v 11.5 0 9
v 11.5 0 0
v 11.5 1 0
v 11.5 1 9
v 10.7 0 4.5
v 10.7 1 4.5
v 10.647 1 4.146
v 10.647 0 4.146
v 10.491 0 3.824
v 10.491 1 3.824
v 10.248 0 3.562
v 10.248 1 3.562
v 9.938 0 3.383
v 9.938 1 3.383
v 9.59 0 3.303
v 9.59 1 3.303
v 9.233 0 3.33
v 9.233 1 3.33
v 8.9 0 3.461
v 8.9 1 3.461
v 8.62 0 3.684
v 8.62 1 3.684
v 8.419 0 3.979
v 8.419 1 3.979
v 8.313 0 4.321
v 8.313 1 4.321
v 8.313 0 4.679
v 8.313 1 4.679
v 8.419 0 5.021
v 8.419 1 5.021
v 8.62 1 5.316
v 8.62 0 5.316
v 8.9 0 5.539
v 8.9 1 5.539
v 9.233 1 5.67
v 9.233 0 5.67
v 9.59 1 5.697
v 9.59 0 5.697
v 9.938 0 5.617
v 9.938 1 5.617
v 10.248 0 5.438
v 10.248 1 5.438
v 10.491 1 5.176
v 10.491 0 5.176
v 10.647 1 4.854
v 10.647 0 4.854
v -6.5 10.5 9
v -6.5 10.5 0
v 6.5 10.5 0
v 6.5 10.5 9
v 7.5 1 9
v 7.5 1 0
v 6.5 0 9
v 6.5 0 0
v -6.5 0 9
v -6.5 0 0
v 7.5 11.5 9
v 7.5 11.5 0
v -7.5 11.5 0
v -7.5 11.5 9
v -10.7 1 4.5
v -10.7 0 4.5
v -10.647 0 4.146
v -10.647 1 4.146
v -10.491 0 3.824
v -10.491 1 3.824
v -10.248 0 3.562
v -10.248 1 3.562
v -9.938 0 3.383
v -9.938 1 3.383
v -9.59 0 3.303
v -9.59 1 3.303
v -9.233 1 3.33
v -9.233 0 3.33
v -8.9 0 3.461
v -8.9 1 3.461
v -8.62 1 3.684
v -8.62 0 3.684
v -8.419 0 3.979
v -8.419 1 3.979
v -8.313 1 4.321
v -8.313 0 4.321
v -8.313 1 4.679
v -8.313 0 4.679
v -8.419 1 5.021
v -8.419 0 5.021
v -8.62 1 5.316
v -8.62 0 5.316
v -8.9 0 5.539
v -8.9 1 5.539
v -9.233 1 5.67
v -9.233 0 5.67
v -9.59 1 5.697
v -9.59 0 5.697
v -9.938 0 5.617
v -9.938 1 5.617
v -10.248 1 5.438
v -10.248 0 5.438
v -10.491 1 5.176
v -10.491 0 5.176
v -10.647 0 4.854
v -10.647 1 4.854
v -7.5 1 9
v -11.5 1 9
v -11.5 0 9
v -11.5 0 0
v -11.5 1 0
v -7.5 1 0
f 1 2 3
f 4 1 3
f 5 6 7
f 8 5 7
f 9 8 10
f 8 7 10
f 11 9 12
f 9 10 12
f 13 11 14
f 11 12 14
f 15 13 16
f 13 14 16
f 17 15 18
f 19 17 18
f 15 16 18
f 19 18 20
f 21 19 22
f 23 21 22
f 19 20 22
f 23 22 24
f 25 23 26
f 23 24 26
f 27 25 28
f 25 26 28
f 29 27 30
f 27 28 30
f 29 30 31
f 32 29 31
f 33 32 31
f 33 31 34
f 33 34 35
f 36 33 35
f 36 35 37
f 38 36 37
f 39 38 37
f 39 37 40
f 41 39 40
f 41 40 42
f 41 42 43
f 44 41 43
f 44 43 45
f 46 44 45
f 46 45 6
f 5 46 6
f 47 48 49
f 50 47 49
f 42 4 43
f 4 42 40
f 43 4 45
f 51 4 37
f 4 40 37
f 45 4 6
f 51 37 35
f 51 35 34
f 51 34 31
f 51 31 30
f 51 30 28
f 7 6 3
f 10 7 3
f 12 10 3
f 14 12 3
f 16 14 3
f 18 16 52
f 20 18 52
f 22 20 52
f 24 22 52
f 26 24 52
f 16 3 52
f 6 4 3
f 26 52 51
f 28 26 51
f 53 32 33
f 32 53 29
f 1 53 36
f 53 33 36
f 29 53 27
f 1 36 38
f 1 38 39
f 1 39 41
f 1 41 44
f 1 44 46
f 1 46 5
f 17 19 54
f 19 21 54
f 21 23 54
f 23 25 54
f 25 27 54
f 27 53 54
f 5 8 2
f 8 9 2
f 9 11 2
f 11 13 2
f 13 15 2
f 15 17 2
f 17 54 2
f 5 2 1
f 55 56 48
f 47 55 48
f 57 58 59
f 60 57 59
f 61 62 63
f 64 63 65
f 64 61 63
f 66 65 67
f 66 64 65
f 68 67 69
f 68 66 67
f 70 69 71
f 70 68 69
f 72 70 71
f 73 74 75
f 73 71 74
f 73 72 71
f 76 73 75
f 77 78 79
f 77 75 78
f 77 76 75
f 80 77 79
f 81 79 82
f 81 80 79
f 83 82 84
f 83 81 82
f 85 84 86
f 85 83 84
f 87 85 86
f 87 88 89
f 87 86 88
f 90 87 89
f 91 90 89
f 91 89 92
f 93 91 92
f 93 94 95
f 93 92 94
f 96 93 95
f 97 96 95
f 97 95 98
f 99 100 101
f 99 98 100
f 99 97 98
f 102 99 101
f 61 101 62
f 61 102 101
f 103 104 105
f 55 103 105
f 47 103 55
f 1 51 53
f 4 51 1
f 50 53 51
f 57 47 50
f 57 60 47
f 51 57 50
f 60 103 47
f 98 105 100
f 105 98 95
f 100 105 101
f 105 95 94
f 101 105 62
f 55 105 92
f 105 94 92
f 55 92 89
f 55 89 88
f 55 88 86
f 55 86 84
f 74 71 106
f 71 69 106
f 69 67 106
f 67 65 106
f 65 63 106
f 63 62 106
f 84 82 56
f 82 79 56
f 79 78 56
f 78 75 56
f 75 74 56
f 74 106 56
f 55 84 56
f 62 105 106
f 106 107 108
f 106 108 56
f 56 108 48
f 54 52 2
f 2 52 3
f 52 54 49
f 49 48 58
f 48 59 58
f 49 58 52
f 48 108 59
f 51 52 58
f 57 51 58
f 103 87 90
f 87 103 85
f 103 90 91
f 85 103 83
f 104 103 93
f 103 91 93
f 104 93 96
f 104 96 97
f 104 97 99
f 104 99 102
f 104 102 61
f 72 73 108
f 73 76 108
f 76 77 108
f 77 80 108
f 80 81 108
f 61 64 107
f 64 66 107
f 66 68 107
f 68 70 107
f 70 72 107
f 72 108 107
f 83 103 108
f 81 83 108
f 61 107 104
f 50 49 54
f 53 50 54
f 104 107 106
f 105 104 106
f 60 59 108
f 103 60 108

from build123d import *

# Parameters (mm, degrees)
BOSS_EXTRUDE1_DEPTH = 9
SKETCH2_R           = 1.2
CUT_EXTRUDE1_DEPTH  = 29


with BuildPart() as part:
    # Sketch1 → Boss-Extrude1 (new body)
    with BuildSketch(Plane.XY):
        Polygon((7.5, 1), (7.5, 11.5), (-7.5, 11.5), (-7.5, 1), (-11.5, 1), (-11.5, 0), (-6.5, 0), (-6.5, 10.5), (6.5, 10.5), (6.5, 0), (11.5, 0), (11.5, 1), align=None)
    extrude(amount=BOSS_EXTRUDE1_DEPTH)

    # Sketch2 → Cut-Extrude1 (cut)
    with BuildSketch(Plane(origin=(0, 1, 0), x_dir=(1, 0, 0), z_dir=(0, 1, 0))):
        with Locations((9.5, -4.5)):
            Circle(SKETCH2_R)
    cut_extrude1 = extrude(amount=-CUT_EXTRUDE1_DEPTH, mode=Mode.SUBTRACT)

    # Mirror1: Cut-Extrude1 across plane
    add(cut_extrude1.mirror(Plane(origin=(0, 0, 0), x_dir=(0, 0, 1), z_dir=(1, 0, 0))), mode=Mode.SUBTRACT)


solid = part.part
